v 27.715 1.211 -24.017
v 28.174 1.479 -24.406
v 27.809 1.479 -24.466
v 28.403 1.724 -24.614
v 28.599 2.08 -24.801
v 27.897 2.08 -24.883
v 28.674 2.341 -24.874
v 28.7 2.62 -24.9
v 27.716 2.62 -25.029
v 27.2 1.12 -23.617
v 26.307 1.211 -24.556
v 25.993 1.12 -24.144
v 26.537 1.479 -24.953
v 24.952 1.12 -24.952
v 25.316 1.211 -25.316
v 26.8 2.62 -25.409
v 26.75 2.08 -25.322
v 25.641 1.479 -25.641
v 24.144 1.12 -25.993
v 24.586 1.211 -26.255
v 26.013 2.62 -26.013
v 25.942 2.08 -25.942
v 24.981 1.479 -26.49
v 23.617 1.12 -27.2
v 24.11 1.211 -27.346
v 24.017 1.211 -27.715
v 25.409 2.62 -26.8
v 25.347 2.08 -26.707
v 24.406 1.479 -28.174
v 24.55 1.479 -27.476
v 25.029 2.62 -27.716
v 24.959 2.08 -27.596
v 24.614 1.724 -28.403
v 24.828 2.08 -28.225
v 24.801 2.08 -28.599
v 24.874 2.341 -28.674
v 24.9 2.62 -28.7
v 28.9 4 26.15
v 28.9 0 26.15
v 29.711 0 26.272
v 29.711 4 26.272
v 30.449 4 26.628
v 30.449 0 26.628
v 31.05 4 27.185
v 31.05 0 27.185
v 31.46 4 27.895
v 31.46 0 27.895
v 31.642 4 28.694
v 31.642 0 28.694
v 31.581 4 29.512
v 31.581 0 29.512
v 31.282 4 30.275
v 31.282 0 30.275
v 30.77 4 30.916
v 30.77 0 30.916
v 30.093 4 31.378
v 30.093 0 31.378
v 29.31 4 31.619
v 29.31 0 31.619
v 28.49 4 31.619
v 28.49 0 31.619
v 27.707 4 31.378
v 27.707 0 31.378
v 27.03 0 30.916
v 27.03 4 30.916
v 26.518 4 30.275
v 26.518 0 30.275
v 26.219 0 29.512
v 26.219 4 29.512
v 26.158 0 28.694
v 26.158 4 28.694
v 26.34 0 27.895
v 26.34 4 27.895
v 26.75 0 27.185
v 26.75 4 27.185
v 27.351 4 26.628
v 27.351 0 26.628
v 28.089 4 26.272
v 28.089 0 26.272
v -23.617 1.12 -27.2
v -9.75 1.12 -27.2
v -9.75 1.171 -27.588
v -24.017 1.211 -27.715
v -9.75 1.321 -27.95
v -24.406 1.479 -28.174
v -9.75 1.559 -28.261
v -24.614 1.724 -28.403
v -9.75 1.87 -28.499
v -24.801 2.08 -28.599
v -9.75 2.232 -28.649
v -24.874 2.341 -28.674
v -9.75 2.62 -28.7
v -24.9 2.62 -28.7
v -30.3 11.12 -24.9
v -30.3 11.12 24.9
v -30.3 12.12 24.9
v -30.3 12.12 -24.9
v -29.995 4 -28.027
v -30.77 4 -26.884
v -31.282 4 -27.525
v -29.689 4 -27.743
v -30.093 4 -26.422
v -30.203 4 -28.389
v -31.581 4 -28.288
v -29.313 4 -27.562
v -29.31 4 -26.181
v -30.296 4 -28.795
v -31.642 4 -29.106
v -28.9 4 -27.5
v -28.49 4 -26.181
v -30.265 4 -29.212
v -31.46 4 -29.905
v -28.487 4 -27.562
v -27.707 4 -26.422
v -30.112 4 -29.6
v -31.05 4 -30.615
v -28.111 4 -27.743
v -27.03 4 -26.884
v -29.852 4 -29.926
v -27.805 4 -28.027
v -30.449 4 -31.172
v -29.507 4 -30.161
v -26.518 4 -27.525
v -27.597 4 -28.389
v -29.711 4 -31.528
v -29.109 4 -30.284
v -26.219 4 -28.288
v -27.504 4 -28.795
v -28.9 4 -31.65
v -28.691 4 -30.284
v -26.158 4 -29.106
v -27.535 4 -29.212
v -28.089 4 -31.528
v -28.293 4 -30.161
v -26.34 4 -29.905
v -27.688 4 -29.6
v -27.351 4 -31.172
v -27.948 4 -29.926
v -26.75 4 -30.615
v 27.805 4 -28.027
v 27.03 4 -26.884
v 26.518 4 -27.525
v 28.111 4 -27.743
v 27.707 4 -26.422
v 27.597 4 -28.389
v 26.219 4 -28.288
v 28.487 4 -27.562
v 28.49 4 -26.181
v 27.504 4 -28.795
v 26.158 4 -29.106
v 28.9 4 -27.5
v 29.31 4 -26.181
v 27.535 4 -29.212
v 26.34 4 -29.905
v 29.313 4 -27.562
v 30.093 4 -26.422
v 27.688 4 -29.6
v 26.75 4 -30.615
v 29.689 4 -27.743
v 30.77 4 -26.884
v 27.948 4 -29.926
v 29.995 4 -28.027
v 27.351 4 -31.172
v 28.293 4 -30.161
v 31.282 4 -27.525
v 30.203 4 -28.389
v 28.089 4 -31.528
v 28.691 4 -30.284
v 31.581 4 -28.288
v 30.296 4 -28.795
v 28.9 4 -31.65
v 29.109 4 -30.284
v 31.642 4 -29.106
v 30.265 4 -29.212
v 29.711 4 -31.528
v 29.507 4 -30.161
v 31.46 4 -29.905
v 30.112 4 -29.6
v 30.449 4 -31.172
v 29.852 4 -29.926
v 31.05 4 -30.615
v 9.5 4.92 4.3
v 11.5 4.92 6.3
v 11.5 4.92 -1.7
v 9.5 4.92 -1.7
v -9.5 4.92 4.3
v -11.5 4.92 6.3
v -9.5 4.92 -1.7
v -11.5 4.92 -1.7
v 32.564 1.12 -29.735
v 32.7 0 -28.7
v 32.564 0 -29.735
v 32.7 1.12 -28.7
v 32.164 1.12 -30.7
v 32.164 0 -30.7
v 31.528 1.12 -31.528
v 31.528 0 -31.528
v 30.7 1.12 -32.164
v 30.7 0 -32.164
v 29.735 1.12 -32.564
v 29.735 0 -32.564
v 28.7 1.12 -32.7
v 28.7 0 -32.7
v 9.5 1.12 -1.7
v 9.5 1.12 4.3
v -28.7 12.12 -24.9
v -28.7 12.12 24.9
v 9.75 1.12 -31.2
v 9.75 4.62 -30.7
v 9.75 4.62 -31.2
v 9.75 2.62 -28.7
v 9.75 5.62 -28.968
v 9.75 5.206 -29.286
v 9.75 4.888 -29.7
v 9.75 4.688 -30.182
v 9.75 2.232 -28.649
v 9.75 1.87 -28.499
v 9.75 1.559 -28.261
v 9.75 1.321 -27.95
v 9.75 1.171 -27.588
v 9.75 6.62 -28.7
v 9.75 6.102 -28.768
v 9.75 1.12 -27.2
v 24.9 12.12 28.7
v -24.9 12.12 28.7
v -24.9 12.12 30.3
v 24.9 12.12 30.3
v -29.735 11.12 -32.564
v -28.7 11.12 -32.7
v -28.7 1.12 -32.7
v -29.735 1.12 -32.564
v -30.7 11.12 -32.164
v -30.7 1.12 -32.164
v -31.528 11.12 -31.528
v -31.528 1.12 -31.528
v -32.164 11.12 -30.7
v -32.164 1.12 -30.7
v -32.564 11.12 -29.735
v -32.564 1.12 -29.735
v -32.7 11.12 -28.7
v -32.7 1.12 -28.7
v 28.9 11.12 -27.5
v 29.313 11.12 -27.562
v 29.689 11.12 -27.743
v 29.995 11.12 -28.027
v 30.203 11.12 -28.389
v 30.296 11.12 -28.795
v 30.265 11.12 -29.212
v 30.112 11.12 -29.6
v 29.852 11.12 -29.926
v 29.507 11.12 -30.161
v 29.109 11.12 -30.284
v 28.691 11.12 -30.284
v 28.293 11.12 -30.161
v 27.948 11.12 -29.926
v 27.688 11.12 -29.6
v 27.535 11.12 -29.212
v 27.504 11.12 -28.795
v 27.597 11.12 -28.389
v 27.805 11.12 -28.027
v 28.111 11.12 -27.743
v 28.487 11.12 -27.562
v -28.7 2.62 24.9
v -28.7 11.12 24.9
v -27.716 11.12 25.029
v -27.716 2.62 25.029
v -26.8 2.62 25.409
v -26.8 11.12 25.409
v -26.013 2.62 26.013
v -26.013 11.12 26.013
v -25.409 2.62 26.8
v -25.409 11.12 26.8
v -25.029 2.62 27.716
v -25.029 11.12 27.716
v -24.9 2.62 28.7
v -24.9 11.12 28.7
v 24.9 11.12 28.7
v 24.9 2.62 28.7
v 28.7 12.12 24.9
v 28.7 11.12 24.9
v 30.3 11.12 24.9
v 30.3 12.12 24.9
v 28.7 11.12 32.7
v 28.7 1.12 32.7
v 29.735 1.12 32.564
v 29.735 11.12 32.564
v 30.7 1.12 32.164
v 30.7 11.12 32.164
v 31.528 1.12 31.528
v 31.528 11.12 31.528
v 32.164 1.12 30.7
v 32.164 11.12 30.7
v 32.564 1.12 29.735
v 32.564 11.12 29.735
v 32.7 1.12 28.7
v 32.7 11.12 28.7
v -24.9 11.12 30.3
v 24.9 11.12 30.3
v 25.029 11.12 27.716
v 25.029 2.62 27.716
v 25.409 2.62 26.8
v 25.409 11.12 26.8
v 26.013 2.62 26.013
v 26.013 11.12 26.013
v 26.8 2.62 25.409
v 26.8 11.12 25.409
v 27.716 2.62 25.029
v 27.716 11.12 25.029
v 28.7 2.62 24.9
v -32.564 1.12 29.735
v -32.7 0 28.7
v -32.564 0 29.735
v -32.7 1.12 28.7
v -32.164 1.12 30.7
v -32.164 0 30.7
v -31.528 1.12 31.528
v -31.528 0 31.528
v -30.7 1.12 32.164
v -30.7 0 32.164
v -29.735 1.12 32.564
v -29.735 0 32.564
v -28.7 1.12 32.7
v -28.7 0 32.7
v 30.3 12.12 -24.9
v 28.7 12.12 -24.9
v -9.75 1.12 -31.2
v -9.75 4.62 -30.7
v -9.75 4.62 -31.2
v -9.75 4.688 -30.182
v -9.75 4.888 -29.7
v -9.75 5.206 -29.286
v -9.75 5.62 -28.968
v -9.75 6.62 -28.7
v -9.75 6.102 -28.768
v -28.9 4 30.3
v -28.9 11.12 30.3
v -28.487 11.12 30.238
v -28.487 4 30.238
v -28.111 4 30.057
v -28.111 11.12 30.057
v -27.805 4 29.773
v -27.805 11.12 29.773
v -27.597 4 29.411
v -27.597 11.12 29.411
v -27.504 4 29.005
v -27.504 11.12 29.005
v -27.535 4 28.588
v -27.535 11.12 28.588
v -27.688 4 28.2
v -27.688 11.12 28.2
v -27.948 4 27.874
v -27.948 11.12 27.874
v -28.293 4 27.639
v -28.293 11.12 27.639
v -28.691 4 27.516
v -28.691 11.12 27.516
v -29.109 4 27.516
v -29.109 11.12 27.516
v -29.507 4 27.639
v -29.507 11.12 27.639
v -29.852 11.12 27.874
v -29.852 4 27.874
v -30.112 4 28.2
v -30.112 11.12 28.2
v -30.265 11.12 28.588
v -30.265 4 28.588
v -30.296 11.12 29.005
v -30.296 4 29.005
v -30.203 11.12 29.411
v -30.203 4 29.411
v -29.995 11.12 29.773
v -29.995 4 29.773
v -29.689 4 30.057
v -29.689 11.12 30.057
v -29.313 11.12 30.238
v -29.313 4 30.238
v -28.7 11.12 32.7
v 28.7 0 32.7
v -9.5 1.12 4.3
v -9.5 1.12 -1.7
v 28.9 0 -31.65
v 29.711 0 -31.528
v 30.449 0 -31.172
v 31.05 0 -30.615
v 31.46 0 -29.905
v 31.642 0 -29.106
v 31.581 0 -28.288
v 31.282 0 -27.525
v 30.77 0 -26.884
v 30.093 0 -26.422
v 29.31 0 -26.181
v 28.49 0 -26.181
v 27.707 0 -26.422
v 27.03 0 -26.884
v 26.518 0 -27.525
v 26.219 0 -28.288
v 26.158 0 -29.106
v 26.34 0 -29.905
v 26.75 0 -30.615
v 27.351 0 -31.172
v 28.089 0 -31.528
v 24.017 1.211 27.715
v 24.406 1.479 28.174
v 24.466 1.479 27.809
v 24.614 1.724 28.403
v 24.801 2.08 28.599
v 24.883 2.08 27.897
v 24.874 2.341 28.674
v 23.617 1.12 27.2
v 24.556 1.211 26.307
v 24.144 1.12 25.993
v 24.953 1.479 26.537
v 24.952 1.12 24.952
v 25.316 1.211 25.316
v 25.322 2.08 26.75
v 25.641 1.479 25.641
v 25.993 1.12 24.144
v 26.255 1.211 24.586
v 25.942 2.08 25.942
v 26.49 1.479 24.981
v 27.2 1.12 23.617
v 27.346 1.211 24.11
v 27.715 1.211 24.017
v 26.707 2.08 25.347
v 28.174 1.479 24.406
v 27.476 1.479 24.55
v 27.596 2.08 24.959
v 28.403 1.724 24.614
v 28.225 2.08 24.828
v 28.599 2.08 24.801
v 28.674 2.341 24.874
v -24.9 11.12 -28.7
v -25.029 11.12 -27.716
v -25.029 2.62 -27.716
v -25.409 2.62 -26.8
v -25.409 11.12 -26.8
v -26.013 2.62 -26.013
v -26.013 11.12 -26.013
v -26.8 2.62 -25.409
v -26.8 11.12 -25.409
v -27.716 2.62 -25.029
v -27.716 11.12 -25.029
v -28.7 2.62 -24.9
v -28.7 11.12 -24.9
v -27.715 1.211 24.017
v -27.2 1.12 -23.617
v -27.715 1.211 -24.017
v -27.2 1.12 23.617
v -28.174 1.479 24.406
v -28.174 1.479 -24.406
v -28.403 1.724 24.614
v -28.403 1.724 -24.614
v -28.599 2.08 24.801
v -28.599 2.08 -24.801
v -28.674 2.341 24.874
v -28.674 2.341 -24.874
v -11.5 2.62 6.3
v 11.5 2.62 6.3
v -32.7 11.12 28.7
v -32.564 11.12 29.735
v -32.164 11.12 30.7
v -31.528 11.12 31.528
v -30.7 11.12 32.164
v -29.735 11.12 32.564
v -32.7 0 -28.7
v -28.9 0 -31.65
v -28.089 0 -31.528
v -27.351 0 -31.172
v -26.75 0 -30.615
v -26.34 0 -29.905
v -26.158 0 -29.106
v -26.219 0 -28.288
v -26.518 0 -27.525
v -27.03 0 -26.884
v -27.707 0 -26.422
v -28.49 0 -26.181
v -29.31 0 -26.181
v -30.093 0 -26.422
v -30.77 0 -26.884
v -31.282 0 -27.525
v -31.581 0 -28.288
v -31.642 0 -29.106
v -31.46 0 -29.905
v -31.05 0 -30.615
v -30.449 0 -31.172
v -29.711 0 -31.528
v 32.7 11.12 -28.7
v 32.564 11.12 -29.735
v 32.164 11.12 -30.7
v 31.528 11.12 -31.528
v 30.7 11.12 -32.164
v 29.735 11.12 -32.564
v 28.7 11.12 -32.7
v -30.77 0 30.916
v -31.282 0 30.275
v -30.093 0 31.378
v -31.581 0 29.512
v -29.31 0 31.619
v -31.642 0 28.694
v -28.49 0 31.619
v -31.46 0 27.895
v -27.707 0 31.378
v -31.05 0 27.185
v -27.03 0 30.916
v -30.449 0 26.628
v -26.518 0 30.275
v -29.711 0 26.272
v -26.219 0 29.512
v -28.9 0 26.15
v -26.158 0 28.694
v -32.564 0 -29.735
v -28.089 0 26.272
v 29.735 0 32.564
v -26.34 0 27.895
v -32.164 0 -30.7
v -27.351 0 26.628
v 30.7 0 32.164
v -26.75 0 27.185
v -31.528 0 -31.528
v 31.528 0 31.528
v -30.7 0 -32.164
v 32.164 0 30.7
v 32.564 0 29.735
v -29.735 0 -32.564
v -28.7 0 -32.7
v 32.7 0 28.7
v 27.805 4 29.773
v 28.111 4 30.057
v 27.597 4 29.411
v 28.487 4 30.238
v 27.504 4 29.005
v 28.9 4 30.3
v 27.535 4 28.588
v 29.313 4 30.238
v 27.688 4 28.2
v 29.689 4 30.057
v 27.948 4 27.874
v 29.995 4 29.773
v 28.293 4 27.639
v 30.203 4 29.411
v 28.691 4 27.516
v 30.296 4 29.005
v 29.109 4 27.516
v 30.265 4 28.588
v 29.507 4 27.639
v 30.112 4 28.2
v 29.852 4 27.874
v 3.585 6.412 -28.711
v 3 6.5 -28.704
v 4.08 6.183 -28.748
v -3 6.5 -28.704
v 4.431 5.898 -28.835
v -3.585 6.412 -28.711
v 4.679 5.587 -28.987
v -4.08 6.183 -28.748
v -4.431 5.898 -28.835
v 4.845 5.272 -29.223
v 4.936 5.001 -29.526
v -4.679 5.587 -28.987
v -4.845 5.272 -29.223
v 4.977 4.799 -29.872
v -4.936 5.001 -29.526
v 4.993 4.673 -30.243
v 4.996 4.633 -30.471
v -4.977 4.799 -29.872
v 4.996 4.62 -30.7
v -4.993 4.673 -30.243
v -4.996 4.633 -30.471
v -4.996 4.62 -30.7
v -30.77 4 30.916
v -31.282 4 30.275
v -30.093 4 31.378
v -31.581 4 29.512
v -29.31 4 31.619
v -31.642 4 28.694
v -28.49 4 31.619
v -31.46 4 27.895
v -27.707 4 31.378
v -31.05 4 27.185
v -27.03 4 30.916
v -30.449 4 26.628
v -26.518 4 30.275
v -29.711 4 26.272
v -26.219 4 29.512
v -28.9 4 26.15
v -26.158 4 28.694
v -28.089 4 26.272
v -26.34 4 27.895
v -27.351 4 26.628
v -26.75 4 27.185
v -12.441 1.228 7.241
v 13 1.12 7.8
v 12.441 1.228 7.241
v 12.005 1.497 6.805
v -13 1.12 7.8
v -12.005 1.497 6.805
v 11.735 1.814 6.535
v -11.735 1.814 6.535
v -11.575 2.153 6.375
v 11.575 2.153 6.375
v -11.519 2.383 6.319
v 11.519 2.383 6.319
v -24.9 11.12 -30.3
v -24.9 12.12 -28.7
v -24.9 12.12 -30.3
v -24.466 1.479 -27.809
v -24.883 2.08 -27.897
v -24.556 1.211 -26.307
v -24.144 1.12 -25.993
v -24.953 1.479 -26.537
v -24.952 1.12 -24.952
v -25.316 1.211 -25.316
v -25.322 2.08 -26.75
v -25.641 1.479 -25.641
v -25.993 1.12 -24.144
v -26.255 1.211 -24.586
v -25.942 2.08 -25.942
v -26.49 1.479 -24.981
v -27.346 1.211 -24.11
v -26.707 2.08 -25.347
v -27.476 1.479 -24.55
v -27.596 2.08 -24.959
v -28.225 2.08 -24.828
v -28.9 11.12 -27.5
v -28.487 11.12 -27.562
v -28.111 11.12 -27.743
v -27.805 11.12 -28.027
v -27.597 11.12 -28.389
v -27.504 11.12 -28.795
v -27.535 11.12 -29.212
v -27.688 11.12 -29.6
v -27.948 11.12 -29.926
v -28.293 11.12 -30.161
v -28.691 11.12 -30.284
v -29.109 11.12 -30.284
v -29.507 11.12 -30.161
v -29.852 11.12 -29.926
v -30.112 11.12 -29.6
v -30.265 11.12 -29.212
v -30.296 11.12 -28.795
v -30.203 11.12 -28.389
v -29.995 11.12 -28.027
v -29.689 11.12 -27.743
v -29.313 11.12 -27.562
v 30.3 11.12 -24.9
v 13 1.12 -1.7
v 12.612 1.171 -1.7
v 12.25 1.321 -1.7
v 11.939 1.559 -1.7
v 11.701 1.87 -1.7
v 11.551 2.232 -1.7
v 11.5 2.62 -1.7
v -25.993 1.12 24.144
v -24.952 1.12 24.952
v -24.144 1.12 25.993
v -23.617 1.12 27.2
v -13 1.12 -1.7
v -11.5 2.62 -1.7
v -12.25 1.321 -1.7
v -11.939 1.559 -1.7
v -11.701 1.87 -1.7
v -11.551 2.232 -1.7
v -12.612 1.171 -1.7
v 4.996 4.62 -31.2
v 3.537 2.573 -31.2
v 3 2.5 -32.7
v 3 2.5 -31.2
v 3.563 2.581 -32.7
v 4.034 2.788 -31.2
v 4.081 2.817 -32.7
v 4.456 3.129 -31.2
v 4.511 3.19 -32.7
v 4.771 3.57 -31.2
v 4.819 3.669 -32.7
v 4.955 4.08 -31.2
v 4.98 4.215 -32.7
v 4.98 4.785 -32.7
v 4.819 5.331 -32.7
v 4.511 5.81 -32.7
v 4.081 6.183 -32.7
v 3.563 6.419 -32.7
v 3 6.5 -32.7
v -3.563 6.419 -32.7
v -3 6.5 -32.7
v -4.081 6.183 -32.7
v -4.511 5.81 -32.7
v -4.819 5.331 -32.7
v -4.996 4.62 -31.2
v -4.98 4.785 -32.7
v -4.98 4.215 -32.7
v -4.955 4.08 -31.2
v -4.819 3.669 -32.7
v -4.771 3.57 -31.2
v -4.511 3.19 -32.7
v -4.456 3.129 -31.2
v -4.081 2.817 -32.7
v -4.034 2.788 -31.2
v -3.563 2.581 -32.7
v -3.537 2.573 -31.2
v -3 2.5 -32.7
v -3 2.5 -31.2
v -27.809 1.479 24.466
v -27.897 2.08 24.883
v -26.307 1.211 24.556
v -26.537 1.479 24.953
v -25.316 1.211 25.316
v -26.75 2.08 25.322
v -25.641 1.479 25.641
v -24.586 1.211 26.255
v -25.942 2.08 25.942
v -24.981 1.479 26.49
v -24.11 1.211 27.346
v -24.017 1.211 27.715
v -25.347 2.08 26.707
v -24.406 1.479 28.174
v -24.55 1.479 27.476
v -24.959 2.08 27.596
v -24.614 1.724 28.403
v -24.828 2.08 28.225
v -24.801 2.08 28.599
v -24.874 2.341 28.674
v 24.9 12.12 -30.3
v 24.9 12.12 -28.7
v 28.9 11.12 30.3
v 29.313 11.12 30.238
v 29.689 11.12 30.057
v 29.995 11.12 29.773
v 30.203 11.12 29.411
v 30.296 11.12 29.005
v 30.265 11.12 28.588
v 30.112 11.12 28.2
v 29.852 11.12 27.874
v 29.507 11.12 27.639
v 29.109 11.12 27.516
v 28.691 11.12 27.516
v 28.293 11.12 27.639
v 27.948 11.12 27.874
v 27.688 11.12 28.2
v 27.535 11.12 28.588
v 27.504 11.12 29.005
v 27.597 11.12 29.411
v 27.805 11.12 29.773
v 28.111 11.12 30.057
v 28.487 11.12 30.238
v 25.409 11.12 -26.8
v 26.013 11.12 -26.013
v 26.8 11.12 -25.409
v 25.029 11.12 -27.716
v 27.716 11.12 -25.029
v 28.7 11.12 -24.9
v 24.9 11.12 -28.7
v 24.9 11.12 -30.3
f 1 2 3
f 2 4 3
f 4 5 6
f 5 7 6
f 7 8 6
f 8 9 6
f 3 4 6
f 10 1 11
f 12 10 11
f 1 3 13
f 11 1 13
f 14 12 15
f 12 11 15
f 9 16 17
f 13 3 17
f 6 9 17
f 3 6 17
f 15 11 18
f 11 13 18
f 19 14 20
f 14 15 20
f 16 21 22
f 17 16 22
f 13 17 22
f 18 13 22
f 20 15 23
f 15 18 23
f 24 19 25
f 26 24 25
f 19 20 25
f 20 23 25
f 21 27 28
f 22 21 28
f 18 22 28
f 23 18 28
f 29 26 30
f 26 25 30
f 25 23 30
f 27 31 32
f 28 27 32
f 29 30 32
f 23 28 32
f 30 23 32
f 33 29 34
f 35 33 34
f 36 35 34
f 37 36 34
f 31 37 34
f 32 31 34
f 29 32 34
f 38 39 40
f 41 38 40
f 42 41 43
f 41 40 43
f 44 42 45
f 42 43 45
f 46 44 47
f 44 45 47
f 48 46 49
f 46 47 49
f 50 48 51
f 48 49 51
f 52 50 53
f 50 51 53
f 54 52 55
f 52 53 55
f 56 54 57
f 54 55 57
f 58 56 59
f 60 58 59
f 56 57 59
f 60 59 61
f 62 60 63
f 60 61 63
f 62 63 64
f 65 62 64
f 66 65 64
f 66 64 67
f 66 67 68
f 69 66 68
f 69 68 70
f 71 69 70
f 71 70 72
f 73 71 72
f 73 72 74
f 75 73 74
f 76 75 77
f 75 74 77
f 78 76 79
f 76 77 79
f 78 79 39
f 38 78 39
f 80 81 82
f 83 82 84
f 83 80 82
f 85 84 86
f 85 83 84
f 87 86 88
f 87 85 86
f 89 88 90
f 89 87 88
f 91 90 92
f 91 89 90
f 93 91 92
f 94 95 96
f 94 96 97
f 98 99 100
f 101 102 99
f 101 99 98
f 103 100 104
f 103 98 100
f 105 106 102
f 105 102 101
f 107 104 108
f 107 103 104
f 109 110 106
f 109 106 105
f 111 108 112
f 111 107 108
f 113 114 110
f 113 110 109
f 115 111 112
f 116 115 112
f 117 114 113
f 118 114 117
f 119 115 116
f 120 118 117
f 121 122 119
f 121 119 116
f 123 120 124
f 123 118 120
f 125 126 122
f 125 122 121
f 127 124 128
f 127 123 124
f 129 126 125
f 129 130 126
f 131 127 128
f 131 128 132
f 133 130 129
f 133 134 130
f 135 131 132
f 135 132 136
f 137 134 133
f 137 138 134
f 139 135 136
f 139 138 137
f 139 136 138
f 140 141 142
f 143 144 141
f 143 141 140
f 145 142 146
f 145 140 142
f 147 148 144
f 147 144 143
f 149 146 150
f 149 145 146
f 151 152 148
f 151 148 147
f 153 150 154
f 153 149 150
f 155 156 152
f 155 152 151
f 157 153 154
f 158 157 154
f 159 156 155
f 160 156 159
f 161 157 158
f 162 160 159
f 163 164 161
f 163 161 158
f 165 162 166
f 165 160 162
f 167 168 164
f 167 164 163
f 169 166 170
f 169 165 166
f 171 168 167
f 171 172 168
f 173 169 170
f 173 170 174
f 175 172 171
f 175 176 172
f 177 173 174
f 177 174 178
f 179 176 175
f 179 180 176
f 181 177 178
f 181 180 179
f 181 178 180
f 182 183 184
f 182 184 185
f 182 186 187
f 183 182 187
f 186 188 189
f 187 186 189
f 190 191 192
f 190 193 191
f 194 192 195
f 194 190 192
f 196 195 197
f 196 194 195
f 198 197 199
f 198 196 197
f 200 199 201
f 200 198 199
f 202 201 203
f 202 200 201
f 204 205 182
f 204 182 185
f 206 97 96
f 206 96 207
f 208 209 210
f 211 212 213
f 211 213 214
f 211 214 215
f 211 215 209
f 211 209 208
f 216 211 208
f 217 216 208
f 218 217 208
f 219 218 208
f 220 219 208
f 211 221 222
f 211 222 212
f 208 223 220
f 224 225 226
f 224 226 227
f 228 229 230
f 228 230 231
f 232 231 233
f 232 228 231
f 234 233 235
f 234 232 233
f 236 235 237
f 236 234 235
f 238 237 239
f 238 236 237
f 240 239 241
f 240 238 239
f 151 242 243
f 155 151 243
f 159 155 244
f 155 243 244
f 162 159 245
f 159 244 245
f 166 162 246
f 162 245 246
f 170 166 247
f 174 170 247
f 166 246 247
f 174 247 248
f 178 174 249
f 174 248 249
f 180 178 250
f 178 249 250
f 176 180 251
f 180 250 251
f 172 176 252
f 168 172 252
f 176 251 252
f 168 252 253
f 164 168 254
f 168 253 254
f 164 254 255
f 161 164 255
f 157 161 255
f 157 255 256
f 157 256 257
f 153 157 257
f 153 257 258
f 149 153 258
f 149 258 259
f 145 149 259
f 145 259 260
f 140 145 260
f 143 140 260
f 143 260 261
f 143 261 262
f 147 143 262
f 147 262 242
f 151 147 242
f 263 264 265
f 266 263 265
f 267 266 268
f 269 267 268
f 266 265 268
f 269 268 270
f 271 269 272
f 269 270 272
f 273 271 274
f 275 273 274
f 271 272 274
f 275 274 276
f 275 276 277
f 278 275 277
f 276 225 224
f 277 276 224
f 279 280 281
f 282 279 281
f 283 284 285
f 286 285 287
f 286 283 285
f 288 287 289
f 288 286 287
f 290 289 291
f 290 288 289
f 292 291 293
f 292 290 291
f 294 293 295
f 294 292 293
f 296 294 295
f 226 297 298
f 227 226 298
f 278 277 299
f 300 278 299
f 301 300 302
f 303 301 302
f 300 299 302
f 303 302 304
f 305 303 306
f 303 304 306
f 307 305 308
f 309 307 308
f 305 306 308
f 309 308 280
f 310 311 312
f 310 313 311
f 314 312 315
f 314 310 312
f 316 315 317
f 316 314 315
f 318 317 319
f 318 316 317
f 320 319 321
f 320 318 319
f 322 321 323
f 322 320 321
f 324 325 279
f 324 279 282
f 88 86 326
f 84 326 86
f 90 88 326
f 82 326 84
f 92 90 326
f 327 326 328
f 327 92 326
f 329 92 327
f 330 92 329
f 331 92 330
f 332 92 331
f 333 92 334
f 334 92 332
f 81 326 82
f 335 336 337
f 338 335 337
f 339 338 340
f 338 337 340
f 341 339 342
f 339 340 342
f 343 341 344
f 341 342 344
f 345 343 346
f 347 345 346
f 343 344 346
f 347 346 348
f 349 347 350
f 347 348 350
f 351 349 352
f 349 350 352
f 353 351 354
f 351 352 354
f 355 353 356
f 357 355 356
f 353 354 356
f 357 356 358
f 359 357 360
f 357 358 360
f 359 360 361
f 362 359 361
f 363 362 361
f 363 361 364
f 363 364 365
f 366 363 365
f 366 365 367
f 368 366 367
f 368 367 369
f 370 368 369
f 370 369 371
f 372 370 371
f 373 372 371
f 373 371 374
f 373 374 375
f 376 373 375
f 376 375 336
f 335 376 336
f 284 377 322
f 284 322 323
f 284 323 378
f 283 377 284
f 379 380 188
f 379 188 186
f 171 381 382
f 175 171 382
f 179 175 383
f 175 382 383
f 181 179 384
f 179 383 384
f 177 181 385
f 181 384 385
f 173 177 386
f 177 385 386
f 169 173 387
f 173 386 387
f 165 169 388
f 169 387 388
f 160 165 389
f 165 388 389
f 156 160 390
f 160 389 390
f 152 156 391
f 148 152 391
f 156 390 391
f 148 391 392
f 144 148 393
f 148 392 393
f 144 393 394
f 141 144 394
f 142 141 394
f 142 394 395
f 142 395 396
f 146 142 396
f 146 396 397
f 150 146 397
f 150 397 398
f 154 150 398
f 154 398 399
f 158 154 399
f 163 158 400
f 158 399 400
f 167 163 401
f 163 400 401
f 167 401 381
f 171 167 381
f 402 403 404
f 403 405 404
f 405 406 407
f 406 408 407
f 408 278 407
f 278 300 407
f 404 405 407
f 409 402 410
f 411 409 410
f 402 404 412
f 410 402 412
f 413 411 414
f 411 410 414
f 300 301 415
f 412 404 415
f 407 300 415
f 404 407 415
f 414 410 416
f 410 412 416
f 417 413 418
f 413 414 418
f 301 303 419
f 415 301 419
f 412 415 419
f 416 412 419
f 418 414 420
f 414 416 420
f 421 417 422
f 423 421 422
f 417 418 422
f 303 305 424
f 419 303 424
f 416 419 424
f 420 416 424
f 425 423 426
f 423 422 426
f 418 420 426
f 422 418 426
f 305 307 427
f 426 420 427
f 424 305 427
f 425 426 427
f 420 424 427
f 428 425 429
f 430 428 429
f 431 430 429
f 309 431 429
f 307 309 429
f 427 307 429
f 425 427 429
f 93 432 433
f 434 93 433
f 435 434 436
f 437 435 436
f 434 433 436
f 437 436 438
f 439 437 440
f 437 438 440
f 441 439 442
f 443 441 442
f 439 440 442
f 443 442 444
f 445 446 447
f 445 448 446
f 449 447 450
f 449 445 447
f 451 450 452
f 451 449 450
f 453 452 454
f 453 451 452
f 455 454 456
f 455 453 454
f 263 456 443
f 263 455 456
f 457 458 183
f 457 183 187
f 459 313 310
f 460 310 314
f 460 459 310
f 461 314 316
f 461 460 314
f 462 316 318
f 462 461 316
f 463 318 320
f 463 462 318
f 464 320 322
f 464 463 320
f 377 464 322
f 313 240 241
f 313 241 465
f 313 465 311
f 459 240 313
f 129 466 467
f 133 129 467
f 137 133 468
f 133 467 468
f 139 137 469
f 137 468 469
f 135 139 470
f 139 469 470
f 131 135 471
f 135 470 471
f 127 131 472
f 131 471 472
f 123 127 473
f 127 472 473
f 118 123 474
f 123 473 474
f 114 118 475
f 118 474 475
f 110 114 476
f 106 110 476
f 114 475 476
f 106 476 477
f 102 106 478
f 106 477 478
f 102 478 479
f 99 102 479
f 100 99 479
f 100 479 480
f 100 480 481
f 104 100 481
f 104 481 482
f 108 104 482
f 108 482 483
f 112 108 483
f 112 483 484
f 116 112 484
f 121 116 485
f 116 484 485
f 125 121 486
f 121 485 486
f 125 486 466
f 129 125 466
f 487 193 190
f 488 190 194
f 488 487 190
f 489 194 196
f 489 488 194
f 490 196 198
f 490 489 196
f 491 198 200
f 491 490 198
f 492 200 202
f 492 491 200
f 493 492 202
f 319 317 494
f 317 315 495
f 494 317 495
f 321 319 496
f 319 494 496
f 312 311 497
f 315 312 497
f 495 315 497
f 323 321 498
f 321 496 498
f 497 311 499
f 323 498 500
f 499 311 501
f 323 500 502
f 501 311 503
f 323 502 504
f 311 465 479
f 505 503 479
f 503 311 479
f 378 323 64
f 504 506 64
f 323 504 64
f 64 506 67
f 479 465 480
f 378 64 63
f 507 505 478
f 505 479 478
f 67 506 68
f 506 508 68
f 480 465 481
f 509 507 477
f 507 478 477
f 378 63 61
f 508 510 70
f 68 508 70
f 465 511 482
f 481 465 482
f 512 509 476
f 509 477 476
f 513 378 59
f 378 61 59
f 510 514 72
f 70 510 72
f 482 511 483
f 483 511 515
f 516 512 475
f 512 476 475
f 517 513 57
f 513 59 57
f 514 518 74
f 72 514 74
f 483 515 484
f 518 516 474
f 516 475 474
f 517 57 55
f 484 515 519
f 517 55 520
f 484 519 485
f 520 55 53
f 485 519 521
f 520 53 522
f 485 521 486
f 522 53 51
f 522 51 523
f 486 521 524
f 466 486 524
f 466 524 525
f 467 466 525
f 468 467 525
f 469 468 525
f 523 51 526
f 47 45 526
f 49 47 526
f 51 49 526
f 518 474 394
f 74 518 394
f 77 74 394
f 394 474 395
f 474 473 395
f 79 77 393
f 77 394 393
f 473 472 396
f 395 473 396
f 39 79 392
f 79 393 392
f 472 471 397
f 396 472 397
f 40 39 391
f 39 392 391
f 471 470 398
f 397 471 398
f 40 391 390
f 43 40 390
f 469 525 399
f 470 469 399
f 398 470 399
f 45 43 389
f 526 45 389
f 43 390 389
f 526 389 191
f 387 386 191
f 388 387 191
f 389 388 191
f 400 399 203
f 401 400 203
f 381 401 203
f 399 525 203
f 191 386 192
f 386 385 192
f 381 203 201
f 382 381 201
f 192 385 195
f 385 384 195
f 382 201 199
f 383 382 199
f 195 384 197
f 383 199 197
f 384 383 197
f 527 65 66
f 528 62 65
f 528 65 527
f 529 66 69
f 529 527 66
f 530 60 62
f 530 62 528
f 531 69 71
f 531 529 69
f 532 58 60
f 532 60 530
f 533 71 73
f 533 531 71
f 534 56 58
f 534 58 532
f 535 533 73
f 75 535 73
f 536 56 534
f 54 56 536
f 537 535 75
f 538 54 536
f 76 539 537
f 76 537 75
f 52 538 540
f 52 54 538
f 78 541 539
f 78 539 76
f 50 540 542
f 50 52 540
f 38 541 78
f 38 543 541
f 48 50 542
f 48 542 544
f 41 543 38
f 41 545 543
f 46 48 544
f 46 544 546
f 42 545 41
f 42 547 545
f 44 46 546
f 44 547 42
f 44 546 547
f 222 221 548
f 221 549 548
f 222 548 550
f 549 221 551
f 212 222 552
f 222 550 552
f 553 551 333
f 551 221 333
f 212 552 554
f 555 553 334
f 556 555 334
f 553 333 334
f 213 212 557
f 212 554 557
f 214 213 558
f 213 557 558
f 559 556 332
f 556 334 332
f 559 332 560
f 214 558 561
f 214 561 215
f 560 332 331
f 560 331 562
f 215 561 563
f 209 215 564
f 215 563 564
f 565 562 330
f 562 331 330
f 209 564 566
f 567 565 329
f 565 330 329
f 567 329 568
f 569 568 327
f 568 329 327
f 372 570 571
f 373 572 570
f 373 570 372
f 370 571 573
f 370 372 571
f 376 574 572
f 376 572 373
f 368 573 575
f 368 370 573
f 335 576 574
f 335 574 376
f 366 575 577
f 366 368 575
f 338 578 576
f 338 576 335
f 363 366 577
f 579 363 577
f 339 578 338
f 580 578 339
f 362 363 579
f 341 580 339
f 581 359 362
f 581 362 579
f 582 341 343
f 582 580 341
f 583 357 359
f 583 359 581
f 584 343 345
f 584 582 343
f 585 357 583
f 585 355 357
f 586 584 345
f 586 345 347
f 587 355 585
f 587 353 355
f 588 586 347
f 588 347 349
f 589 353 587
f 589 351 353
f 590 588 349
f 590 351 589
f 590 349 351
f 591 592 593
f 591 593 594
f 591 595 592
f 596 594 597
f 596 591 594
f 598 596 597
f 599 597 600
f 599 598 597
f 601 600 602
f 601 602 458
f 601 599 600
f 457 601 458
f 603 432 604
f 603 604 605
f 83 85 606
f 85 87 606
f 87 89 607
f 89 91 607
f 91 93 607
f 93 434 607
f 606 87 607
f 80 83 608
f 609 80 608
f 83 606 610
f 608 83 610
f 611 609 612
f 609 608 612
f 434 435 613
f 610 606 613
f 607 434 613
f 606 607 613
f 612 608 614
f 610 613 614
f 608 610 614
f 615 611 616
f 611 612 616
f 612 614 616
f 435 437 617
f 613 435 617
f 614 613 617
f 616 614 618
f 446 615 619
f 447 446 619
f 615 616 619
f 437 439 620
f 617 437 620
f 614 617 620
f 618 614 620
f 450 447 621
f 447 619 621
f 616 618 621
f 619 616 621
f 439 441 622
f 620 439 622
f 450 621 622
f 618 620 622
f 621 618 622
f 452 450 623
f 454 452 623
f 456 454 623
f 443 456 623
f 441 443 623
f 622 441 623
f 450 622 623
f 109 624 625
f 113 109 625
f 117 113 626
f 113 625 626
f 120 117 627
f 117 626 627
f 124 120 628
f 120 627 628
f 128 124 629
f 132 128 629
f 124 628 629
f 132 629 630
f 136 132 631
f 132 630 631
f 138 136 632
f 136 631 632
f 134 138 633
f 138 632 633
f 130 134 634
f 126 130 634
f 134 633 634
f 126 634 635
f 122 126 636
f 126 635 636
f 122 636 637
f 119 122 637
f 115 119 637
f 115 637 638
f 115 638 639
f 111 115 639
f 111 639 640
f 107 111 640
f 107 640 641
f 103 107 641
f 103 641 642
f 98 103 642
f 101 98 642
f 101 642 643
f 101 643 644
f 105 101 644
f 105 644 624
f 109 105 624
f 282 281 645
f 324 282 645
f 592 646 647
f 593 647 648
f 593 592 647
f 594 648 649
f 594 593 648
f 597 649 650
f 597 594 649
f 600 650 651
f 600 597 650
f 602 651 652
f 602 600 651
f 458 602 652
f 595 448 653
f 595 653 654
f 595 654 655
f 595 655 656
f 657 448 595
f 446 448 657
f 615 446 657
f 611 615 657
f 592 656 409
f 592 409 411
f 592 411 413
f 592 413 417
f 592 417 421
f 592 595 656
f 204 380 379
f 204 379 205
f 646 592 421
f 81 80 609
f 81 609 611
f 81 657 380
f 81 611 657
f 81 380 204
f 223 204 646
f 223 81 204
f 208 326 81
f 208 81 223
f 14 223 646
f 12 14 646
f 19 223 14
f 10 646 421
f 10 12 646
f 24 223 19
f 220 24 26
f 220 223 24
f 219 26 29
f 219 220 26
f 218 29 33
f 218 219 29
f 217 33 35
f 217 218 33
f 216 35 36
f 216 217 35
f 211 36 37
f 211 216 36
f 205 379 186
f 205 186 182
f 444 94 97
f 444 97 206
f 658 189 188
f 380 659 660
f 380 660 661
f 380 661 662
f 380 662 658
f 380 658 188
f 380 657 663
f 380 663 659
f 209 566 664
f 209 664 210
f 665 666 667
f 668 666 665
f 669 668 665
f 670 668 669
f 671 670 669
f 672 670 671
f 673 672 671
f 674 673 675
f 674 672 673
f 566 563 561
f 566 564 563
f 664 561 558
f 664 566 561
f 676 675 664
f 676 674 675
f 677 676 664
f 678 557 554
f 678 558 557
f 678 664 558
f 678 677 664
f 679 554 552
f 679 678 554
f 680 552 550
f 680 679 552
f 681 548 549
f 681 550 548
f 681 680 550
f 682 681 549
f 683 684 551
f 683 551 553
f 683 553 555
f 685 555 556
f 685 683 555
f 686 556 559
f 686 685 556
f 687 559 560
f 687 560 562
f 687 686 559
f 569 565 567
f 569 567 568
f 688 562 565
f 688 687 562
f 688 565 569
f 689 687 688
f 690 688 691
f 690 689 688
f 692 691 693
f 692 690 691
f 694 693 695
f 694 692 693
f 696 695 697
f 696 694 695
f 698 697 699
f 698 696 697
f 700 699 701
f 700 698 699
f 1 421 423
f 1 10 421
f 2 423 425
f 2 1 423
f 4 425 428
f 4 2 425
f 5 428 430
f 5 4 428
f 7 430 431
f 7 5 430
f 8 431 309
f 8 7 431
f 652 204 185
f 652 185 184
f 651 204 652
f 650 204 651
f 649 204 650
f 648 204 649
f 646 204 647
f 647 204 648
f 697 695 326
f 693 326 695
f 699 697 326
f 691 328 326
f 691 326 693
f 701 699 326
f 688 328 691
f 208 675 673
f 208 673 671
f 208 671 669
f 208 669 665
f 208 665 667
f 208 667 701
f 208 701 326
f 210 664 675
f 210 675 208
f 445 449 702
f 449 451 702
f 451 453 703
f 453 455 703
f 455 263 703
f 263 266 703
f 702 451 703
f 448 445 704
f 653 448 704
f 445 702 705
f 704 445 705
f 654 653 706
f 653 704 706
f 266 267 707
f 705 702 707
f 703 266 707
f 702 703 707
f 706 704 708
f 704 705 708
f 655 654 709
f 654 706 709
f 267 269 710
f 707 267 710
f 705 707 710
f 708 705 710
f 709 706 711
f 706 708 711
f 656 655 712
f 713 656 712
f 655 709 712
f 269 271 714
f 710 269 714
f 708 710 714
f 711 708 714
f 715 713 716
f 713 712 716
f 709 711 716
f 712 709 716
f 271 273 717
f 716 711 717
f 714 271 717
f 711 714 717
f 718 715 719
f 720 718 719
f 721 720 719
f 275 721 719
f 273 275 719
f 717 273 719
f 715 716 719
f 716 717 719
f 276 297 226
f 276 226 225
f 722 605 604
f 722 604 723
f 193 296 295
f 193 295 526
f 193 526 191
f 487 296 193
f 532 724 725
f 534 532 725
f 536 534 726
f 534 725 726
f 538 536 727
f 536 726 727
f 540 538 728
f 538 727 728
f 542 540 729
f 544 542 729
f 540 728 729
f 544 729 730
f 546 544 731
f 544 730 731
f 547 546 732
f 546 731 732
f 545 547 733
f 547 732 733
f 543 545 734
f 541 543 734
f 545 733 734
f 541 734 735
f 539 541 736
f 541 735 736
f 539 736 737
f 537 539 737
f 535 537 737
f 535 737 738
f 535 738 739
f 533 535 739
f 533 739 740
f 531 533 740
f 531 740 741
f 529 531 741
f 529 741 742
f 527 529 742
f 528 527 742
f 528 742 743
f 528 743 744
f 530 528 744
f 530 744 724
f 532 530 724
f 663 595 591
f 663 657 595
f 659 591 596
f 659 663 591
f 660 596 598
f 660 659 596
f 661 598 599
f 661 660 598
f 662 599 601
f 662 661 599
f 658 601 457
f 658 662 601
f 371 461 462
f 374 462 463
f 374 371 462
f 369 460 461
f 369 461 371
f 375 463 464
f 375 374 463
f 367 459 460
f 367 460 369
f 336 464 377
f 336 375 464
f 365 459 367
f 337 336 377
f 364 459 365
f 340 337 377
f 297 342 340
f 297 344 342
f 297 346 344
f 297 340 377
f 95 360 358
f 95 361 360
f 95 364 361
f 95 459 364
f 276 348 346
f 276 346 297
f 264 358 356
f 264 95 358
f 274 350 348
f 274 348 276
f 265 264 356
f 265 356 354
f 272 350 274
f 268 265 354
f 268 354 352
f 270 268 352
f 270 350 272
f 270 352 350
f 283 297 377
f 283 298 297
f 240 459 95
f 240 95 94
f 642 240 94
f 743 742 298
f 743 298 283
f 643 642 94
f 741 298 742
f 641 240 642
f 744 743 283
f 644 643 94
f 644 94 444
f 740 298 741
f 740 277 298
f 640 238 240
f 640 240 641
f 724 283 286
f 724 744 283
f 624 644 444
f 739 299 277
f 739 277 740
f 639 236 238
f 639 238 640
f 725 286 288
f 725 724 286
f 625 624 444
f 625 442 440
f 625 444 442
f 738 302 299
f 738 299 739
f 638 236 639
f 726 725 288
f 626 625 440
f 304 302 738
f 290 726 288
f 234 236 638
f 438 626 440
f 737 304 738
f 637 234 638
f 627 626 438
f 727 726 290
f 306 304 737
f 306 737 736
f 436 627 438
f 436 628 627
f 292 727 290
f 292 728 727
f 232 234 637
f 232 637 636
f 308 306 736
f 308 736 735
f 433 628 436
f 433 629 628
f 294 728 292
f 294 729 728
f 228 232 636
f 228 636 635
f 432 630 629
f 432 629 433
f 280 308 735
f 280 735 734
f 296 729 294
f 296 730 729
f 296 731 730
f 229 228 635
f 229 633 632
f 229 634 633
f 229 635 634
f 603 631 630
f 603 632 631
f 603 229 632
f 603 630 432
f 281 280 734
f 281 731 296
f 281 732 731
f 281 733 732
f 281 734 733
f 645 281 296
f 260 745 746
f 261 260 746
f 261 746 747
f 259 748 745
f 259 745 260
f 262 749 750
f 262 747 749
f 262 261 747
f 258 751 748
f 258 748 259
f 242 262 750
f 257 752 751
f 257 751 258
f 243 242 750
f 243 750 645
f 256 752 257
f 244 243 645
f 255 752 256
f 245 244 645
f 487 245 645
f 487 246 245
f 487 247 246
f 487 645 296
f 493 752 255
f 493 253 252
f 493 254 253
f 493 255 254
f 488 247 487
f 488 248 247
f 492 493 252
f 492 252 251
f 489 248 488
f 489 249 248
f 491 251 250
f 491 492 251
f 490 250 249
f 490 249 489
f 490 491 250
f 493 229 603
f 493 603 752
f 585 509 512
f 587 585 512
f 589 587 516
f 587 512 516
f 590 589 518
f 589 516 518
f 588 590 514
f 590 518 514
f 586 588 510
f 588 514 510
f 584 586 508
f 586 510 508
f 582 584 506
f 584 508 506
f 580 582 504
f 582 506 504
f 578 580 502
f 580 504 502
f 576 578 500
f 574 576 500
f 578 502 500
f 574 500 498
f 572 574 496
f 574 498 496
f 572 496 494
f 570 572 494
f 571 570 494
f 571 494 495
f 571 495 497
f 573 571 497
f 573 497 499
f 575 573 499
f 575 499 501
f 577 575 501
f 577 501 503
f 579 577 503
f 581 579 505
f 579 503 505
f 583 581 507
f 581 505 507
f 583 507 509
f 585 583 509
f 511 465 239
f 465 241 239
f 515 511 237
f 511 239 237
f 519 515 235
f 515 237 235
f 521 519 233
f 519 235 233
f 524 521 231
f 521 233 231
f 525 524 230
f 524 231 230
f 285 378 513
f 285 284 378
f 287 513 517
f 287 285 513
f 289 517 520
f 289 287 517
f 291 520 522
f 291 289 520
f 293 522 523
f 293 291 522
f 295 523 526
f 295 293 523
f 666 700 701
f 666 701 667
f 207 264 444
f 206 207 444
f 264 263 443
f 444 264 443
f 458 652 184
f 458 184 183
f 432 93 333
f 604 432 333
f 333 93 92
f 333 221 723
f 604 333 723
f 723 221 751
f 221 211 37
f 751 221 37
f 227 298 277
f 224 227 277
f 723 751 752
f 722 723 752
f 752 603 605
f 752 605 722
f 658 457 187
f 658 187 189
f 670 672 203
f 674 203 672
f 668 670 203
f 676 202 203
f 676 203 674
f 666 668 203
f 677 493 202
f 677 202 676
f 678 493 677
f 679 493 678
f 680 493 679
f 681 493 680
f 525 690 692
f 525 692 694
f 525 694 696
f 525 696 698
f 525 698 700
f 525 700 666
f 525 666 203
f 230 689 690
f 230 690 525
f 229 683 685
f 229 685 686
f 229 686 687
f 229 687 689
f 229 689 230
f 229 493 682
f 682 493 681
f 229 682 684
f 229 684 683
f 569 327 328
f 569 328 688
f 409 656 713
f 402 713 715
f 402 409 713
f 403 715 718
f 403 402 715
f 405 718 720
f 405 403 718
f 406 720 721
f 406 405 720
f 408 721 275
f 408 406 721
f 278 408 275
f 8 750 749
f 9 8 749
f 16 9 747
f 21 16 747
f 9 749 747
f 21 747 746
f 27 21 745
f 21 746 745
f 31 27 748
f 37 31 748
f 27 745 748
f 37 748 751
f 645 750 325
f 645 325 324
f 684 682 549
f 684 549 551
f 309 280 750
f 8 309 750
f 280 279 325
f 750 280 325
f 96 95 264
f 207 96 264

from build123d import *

# Parameters (mm, degrees)
SKETCH1_W           = 65.4
SKETCH1_H           = 65.4
BOSS_EXTRUDE1_DEPTH = 1.12
FILLET1_R           = 4
BOSS_EXTRUDE2_START = 10
BOSS_EXTRUDE2_DEPTH = 10
CUT_EXTRUDE1_REACH  = 75.96
SKETCH4_W           = 19.5
SKETCH4_H           = 3.5
CUT_EXTRUDE2_DEPTH  = 2.5
FILLET3_R           = 2
SKETCH5_W           = 1.6
SKETCH5_H           = 49.8
SKETCH5_W_2         = 49.8
SKETCH5_H_2         = 1.6
BOSS_EXTRUDE3_DEPTH = 1
BOSS_EXTRUDE4_DEPTH = 3.8
SKETCH7_R           = 1.4
CUT_EXTRUDE3_DEPTH  = 11.12
SKETCH8_R           = 2.75
CUT_EXTRUDE4_DEPTH  = 4
FILLET4_R           = 1.5
FILLET5_R           = 1.5


with BuildPart() as part:
    # Sketch1 → Boss-Extrude1 (new body)
    with BuildSketch(Plane(origin=(0, 0, 0), x_dir=(1, 0, 0), z_dir=(0, 1, 0))):
        Rectangle(SKETCH1_W, SKETCH1_H)
    extrude(amount=BOSS_EXTRUDE1_DEPTH)

    # Fillet1
    fillet1_edges = [part.edges().sort_by_distance(p)[0] for p in [
        (32.7, 0.56, 32.7),
        (-32.7, 0.56, 32.7),
        (-32.7, 0.56, -32.7),
        (32.7, 0.56, -32.7),
    ]]
    fillet(fillet1_edges, radius=FILLET1_R)

    # Sketch2 → Boss-Extrude2 (add)
    with BuildSketch(Plane(origin=(0, 1.12, 0), x_dir=(1, 0, 0), z_dir=(0, 1, 0)).offset(BOSS_EXTRUDE2_START)):
        with BuildLine():
            Line((-32.7, 28.7), (-32.7, -28.7))
            ThreePointArc((-32.7, -28.7), (-31.528427125, -31.528427125), (-28.7, -32.7))
            Line((-28.7, -32.7), (28.7, -32.7))
            ThreePointArc((28.7, -32.7), (31.528427125, -31.528427125), (32.7, -28.7))
            Line((32.7, -28.7), (32.7, 28.7))
            ThreePointArc((32.7, 28.7), (31.528427125, 31.528427125), (28.7, 32.7))
            Line((28.7, 32.7), (-28.7, 32.7))
            ThreePointArc((-28.7, 32.7), (-31.528427125, 31.528427125), (-32.7, 28.7))
        make_face()
        with BuildLine():
            Line((24.9, 28.7), (-24.9, 28.7))
            ThreePointArc((-24.9, 28.7), (-26.012994231, 26.012994231), (-28.7, 24.9))
            Line((-28.7, 24.9), (-28.7, -24.9))
            ThreePointArc((-28.7, -24.9), (-26.012994231, -26.012994231), (-24.9, -28.7))
            Line((-24.9, -28.7), (24.9, -28.7))
            ThreePointArc((24.9, -28.7), (26.012994231, -26.012994231), (28.7, -24.9))
            Line((28.7, -24.9), (28.7, 24.9))
            ThreePointArc((28.7, 24.9), (26.012994231, 26.012994231), (24.9, 28.7))
        make_face(mode=Mode.SUBTRACT)
    extrude(amount=-BOSS_EXTRUDE2_DEPTH)

    # Sketch3 → Cut-Extrude1 (cut, up to next)
    with BuildSketch(Plane(origin=(0, 0, -32.7), x_dir=(-1, 0, 0), z_dir=(0, 0, -1)), mode=Mode.PRIVATE) as cut_extrude1_sk1:
        with BuildLine():
            Line((-3, 6.5), (3, 6.5))
            ThreePointArc((3, 6.5), (5, 4.5), (3, 2.5))
            Line((3, 2.5), (-3, 2.5))
            ThreePointArc((-3, 2.5), (-5, 4.5), (-3, 6.5))
        make_face()
    cut_extrude1_tool1 = extrude(cut_extrude1_sk1.sketch, amount=-CUT_EXTRUDE1_REACH, mode=Mode.PRIVATE) & part.part
    add(cut_extrude1_tool1.solids().sort_by_distance((0, 4.5, -32.7))[0], mode=Mode.SUBTRACT)

    # Sketch4 → Cut-Extrude2 (cut)
    with BuildSketch(Plane.XY.offset(-28.7)):
        with Locations((0, 2.87)):
            Rectangle(SKETCH4_W, SKETCH4_H)
    extrude(amount=-CUT_EXTRUDE2_DEPTH, mode=Mode.SUBTRACT)

    # Fillet3
    # the kernel refuses this fillet: 2 mm, written as the material it takes off along each edge
    with BuildSketch(Plane(origin=(-0.003603246, 4.62, -28.7), x_dir=(0, 1, 0), z_dir=(1, 0, 0)), Plane(origin=(-9.75, 4.62, -28.7), x_dir=(0, 1, 0), z_dir=(1, 0, 0))) as fillet3_piece_1:
        with BuildLine():
            CenterArc((FILLET3_R, -FILLET3_R), FILLET3_R, 90, 90)
            Line((0, -FILLET3_R), (0, 0))
            Line((0, 0), (FILLET3_R, 0))
        make_face()
    extrude(amount=9.753603246, mode=Mode.SUBTRACT)

    # Sketch5 → Boss-Extrude3 (add)
    with BuildSketch(Plane(origin=(0, 11.12, 0), x_dir=(1, 0, 0), z_dir=(0, 1, 0))):
        with Locations((-29.5, 0)):
            Rectangle(SKETCH5_W, SKETCH5_H)
        with Locations((0, -29.5)):
            Rectangle(SKETCH5_W_2, SKETCH5_H_2)
        with Locations((29.5, 0)):
            Rectangle(SKETCH5_W, SKETCH5_H)
        with Locations((0, 29.5)):
            Rectangle(SKETCH5_W_2, SKETCH5_H_2)
    extrude(amount=BOSS_EXTRUDE3_DEPTH)

    # Sketch6 → Boss-Extrude4 (add)
    with BuildSketch(Plane(origin=(0, 1.12, 0), x_dir=(1, 0, 0), z_dir=(0, 1, 0))):
        Polygon((-9.5, -4.3), (9.5, -4.3), (9.5, 1.7), (11.5, 1.7), (11.5, -6.3), (-11.5, -6.3), (-11.5, 1.7), (-9.5, 1.7), align=None)
    extrude(amount=BOSS_EXTRUDE4_DEPTH)

    # Sketch7 → Cut-Extrude3 (cut)
    with BuildSketch(Plane(origin=(0, 11.12, 0), x_dir=(1, 0, 0), z_dir=(0, 1, 0))):
        with Locations(Location((-28.9, 28.9, 0), (0, 0, 270))):
            Circle(SKETCH7_R)
        with Locations(Location((28.9, 28.9, 0), (0, 0, 270))):
            Circle(SKETCH7_R)
        with Locations(Location((28.9, -28.9, 0), (0, 0, 270))):
            Circle(SKETCH7_R)
        with Locations(Location((-28.9, -28.9, 0), (0, 0, 270))):
            Circle(SKETCH7_R)
    extrude(amount=-CUT_EXTRUDE3_DEPTH, mode=Mode.SUBTRACT)

    # Sketch8 → Cut-Extrude4 (cut)
    with BuildSketch(Plane.XZ):
        with Locations(Location((-28.9, 28.9, 0), (0, 0, 270))):
            Circle(SKETCH8_R)
        with Locations(Location((28.9, 28.9, 0), (0, 0, 270))):
            Circle(SKETCH8_R)
        with Locations(Location((28.9, -28.9, 0), (0, 0, 270))):
            Circle(SKETCH8_R)
        with Locations(Location((-28.9, -28.9, 0), (0, 0, 270))):
            Circle(SKETCH8_R)
    extrude(amount=-CUT_EXTRUDE4_DEPTH, mode=Mode.SUBTRACT)

    # Fillet4
    fillet4_edges = [part.edges().sort_by_distance(p)[0] for p in [
        (-11.5, 1.12, 2.3),
        (0, 1.12, 6.3),
        (11.5, 1.12, 2.3),
    ]]
    fillet(fillet4_edges, radius=FILLET4_R)

    # Fillet5
    fillet5_edges = [part.edges().sort_by_distance(p)[0] for p in [
        (-17.325, 1.12, -28.7),
        (26.012994231, 1.12, -26.012994231),
        (17.325, 1.12, -28.7),
        (-26.012994231, 1.12, -26.012994231),
        (-28.7, 1.12, 0),
        (-26.012994231, 1.12, 26.012994231),
        (0, 1.12, 28.7),
        (26.012994231, 1.12, 26.012994231),
        (28.7, 1.12, 0),
    ]]
    fillet(fillet5_edges, radius=FILLET5_R)


solid = part.part
